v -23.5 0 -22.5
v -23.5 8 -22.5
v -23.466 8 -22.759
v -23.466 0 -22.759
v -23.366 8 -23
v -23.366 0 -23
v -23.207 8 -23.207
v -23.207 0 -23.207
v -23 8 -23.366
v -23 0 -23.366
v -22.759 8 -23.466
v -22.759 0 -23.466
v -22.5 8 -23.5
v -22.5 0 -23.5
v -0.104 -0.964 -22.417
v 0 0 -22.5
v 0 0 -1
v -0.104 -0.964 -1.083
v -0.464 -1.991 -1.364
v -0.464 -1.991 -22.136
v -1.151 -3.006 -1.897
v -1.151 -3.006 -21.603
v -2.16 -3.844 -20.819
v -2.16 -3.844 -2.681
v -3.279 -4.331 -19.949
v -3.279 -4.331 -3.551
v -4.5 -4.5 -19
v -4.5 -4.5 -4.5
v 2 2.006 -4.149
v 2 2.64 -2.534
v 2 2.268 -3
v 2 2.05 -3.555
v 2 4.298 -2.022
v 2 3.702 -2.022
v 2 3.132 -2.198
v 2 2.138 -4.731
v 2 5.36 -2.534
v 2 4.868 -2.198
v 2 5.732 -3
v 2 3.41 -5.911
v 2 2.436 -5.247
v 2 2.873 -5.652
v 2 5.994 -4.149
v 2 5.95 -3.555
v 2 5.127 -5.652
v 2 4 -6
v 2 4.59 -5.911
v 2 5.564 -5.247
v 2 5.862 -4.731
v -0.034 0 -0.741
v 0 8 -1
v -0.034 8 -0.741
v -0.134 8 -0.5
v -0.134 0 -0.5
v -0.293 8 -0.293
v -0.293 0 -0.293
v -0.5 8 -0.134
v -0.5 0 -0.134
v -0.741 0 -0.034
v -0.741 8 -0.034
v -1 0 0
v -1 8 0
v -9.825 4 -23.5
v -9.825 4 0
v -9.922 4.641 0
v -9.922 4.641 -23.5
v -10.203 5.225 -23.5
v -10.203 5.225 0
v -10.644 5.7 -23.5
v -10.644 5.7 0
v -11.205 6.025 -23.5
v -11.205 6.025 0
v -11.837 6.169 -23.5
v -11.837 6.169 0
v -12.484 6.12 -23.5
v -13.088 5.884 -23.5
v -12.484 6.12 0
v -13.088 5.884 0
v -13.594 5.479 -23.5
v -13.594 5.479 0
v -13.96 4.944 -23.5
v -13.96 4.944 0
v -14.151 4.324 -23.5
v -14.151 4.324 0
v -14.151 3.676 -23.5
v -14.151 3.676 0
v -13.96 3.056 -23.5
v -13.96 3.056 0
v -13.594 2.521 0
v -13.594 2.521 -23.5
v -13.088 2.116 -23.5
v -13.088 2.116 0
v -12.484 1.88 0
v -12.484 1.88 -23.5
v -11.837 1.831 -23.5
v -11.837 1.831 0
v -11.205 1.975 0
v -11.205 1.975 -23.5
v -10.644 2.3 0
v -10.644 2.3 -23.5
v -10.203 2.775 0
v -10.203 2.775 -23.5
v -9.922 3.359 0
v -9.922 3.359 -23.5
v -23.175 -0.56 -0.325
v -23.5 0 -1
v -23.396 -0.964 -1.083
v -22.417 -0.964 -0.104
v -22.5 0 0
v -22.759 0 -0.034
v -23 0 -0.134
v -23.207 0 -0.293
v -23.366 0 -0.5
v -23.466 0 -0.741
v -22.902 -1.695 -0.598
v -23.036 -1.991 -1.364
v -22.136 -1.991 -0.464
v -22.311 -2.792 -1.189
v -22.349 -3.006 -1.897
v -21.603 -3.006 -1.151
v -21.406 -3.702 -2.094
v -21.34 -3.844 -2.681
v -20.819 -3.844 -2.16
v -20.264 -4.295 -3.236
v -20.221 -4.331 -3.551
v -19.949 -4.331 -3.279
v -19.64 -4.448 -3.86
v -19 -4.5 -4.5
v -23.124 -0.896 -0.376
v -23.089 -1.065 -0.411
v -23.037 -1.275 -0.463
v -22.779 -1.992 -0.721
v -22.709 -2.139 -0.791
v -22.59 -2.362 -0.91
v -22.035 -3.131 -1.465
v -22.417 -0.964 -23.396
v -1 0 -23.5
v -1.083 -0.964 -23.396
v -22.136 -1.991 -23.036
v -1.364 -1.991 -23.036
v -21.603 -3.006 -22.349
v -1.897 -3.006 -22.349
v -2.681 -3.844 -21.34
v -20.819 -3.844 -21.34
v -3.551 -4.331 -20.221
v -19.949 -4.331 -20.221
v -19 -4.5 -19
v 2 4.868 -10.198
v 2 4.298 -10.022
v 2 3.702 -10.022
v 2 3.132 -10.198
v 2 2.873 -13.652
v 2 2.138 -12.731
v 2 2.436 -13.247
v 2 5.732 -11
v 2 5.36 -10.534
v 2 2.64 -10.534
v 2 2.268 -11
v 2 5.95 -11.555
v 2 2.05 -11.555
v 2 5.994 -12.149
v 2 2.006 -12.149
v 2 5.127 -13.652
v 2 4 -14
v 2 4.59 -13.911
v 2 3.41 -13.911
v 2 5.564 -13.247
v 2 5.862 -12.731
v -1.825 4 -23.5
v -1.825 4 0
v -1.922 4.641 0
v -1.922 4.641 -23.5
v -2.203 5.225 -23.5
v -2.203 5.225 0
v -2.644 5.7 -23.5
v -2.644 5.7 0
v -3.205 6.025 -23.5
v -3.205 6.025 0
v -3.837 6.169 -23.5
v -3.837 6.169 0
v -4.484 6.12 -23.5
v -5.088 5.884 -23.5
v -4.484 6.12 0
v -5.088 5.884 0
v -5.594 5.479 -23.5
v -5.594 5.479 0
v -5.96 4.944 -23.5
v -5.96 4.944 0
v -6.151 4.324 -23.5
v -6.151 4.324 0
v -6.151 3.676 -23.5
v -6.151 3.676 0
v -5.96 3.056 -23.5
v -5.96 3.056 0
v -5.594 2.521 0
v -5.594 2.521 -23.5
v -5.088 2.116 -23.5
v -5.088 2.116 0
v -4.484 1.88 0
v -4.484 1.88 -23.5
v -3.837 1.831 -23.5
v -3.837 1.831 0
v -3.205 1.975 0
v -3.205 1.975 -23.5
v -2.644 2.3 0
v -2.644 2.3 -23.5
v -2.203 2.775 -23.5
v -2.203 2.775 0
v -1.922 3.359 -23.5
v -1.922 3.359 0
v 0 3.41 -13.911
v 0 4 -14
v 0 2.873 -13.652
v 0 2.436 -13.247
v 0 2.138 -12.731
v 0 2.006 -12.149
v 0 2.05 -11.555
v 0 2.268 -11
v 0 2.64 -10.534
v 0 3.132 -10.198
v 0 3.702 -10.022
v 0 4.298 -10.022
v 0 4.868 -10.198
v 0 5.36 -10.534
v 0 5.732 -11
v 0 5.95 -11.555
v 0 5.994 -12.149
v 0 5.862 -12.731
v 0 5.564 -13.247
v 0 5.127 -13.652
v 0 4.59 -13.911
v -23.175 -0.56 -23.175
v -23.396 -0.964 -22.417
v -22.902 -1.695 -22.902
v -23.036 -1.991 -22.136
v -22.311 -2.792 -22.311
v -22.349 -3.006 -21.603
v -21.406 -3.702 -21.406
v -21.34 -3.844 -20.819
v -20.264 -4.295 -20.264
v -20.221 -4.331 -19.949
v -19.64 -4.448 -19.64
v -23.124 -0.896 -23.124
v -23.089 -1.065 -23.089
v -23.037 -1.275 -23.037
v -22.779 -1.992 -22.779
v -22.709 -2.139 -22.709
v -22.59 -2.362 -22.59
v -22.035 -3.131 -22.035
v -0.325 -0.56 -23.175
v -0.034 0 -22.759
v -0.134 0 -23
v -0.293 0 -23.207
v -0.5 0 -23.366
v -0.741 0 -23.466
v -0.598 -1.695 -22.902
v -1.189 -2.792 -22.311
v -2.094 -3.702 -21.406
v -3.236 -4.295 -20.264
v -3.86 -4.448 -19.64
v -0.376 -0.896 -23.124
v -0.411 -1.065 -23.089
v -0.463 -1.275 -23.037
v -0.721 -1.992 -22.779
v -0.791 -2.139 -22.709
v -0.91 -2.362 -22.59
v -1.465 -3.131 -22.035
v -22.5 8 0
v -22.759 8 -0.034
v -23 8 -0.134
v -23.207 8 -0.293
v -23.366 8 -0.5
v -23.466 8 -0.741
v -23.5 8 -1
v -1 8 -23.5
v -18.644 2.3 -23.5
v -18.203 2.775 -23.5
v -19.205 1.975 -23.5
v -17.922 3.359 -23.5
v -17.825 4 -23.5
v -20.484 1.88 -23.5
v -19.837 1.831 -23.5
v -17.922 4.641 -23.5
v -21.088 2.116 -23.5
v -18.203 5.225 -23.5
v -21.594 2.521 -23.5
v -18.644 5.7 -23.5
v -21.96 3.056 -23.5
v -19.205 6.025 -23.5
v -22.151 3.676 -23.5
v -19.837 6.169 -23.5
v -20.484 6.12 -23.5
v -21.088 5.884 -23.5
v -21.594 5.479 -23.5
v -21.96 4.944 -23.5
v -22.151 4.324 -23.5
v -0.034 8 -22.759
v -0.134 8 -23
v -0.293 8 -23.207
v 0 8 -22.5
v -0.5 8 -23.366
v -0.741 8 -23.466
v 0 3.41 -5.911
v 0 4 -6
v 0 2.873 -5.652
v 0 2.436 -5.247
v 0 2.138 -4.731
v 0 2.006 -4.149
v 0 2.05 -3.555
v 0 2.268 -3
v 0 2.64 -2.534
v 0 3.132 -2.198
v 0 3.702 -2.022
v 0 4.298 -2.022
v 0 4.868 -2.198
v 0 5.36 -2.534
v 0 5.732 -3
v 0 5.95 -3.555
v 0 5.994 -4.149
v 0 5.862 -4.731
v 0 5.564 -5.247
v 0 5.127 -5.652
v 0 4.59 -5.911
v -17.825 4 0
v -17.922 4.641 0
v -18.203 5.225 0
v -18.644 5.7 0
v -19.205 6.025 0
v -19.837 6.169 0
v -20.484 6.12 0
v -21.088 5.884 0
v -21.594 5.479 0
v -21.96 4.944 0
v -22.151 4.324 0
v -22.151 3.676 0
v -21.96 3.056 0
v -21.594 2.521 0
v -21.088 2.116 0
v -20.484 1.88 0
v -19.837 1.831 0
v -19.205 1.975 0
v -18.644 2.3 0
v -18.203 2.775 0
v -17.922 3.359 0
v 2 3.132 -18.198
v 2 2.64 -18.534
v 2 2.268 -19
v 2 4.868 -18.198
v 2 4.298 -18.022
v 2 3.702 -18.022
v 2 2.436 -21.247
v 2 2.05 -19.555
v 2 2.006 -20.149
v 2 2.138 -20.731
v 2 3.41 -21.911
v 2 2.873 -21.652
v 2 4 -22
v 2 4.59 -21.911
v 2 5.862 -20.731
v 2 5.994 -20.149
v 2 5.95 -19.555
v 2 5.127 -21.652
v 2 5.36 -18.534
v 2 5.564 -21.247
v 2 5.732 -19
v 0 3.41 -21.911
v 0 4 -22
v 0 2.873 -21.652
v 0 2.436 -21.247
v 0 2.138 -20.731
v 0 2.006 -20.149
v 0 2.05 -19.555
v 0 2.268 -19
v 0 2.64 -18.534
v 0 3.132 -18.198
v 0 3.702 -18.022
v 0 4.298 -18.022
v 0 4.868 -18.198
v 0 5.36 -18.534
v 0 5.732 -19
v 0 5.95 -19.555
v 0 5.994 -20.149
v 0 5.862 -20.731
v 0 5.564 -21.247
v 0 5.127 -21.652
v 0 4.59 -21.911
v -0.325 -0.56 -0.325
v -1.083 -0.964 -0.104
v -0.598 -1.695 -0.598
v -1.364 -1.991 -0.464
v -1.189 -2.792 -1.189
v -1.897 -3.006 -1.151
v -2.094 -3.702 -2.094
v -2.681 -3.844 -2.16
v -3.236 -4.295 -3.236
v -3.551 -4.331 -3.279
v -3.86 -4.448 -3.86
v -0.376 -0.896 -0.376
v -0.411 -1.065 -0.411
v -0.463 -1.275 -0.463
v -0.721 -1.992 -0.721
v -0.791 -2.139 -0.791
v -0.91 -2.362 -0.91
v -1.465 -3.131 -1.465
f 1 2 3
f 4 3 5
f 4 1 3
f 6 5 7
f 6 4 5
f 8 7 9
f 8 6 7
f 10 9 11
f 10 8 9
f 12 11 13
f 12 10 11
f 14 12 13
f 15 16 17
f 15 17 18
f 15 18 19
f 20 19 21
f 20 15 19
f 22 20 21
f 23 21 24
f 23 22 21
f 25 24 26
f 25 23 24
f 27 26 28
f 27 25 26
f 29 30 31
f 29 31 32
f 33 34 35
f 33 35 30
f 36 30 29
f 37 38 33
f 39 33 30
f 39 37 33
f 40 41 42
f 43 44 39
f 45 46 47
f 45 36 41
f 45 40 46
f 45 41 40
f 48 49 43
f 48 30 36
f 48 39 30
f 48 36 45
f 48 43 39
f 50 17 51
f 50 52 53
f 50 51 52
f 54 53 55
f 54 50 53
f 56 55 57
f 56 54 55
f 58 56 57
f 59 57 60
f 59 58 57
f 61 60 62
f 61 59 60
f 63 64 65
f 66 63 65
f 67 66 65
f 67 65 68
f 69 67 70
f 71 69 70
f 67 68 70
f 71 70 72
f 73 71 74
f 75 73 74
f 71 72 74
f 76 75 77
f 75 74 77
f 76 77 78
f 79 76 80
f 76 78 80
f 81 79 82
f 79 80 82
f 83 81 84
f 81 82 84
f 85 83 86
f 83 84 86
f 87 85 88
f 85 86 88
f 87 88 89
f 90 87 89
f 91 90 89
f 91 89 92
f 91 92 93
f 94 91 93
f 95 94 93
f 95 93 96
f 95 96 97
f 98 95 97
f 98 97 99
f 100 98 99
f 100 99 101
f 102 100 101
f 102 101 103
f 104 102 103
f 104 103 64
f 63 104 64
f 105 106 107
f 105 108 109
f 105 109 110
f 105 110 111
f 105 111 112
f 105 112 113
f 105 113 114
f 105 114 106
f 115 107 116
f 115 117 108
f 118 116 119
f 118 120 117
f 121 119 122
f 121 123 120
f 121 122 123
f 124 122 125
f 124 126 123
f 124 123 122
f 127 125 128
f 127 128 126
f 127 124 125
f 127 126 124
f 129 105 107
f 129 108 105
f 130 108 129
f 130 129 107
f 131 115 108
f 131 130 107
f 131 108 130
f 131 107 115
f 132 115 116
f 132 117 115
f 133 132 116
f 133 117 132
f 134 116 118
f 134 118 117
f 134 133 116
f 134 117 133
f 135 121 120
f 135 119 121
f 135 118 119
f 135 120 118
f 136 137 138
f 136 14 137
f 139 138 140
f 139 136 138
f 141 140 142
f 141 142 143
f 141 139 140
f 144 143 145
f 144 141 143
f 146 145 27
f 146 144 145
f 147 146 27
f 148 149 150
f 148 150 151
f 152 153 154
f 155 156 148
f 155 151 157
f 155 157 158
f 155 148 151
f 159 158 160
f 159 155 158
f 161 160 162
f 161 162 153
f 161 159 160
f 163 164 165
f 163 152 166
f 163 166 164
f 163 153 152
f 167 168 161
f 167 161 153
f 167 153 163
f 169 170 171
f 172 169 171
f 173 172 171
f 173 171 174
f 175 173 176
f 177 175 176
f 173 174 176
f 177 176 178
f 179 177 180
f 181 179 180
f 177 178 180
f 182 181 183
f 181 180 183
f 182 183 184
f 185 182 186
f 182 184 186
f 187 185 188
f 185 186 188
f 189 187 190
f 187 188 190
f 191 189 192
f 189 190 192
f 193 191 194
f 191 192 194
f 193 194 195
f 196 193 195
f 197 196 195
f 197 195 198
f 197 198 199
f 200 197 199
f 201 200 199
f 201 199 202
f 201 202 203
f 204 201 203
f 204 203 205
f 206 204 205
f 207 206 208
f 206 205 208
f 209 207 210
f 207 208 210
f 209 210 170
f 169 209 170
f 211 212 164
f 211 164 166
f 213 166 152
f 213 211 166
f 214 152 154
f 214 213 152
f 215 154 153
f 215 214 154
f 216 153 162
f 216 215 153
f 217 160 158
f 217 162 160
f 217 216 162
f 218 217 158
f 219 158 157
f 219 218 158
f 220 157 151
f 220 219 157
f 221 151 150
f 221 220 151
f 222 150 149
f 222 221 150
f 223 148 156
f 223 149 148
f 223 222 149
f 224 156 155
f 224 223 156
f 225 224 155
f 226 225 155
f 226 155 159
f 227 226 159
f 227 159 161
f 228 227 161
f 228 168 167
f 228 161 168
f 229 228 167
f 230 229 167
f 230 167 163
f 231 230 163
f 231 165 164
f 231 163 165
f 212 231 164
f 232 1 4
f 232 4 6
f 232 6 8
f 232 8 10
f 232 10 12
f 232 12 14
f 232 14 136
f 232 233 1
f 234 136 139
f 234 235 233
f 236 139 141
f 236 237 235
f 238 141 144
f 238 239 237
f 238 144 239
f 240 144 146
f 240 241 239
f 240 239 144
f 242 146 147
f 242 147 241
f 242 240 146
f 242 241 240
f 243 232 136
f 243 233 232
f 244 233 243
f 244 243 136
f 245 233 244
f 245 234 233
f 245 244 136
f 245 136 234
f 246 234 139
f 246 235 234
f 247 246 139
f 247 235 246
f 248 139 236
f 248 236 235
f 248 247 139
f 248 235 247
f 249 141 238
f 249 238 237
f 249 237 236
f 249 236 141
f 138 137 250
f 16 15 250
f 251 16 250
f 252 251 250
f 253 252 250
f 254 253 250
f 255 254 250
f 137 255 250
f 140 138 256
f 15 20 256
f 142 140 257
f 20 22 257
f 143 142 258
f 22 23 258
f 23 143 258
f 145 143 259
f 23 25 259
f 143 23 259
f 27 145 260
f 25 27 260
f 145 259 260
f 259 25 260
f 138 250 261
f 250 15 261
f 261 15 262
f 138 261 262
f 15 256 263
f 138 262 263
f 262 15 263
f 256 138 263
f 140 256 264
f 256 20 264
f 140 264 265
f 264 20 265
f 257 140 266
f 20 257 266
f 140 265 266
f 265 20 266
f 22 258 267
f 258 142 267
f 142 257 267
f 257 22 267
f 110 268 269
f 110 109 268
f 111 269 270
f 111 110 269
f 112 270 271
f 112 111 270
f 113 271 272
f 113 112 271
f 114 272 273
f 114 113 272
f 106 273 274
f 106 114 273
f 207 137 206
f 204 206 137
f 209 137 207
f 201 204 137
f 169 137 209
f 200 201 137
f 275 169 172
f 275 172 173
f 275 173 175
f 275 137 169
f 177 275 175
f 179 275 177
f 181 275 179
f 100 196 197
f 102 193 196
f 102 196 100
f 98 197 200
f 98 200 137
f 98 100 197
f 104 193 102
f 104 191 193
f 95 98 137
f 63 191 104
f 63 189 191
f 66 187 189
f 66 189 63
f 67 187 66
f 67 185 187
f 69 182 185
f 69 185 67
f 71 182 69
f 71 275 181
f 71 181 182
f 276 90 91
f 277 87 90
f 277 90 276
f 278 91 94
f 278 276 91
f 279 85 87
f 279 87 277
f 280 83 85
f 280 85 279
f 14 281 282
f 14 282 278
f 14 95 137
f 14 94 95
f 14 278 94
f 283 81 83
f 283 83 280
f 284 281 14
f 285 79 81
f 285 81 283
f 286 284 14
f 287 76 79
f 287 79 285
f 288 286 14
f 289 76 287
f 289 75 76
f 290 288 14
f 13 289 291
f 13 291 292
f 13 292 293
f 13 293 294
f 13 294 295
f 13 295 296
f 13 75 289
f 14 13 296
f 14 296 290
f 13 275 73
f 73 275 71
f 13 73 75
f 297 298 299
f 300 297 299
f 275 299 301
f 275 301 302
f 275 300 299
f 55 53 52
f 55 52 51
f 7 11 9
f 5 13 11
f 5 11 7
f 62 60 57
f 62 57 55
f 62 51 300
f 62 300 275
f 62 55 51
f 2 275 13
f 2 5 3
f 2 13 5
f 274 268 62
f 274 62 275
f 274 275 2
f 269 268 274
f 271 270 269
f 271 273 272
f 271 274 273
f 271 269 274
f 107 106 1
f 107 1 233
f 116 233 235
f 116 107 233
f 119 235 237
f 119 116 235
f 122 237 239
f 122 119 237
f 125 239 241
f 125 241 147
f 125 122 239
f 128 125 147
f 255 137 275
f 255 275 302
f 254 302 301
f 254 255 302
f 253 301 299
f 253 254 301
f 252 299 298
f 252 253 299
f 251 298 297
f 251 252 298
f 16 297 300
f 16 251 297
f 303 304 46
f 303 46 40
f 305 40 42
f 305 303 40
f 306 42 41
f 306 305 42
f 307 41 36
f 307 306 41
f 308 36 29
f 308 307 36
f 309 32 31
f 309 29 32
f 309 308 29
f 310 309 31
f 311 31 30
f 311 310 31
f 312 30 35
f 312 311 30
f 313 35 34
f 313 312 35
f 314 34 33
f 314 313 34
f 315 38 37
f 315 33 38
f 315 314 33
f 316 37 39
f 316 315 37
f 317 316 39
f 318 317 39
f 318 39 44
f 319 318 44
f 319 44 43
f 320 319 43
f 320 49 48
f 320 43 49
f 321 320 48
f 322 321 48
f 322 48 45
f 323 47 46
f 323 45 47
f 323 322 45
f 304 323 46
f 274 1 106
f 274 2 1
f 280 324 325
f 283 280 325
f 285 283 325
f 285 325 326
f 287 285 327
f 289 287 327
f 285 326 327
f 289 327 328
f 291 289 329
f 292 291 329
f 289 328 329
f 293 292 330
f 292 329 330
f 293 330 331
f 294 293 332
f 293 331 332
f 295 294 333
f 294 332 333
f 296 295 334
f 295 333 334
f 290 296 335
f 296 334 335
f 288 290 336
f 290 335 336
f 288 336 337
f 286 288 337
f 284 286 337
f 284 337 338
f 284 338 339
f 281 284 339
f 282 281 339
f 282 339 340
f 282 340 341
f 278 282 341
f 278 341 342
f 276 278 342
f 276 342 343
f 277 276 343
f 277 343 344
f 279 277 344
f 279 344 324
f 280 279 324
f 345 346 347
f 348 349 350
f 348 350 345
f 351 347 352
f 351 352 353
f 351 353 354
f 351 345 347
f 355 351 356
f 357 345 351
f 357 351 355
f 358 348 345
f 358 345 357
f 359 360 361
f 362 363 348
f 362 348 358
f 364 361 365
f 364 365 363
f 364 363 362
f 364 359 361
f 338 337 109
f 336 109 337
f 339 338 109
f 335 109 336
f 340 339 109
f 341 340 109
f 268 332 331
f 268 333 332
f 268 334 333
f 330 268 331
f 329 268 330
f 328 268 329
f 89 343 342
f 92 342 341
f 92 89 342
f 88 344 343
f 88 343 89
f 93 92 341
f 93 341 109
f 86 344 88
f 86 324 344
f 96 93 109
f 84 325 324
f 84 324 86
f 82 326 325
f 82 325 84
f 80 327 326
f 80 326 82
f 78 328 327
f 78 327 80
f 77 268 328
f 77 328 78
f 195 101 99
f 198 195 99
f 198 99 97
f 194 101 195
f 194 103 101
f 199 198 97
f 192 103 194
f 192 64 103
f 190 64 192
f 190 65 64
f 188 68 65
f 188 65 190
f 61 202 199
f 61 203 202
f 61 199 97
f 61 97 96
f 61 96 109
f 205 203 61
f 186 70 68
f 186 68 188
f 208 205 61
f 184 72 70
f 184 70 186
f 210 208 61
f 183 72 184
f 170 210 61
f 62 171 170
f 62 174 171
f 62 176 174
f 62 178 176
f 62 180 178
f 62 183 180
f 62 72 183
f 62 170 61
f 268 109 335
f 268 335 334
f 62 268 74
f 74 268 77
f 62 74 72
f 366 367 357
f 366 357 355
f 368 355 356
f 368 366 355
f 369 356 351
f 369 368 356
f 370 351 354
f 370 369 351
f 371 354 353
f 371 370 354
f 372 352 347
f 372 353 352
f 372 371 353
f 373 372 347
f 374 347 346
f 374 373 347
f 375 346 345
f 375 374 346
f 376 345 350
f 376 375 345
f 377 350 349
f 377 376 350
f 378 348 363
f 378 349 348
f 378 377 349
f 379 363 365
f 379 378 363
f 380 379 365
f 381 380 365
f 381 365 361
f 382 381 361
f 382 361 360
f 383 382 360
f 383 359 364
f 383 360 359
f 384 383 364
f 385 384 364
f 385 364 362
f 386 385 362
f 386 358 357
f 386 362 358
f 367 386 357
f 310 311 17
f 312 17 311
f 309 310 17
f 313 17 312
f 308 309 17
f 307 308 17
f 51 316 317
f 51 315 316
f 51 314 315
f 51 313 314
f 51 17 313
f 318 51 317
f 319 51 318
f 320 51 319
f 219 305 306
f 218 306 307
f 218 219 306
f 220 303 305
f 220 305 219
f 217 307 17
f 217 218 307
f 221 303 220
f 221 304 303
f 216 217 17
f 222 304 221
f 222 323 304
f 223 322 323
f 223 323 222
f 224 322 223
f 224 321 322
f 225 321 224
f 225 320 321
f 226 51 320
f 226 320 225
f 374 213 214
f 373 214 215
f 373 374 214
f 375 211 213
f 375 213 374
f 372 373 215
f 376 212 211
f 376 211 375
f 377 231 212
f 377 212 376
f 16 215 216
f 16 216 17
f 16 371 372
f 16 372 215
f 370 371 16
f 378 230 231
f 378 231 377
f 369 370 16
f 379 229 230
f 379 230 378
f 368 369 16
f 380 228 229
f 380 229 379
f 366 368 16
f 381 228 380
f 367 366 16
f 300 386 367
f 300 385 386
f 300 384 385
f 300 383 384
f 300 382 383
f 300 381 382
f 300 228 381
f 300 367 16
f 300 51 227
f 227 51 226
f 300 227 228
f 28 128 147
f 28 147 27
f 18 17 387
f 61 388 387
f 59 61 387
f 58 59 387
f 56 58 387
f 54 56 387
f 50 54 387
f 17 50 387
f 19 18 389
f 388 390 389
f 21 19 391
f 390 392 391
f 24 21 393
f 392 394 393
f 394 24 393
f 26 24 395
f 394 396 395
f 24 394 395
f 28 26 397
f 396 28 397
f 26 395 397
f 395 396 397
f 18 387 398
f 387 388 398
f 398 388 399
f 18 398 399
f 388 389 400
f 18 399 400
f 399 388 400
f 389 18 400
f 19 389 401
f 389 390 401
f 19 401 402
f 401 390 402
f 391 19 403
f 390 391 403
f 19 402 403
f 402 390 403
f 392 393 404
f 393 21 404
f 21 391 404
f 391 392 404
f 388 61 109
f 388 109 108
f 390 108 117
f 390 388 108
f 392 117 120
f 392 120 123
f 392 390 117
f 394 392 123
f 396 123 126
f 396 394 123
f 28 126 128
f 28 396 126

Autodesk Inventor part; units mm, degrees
ref_plane "YZ Plane" through (0, 0, 0) normal (1, 0, 0) x (0, 1, 0)
ref_plane "XZ Plane" through (0, 0, 0) normal (0, 1, 0) x (-1, 0, 0)
ref_plane "XY Plane" through (0, 0, 0) normal (0, 0, 1) x (1, 0, 0)
sketch "Sketch1" plane through (0, 0, 0) normal (0, 1, 0) x (-1, 0, 0)
  line L0 (0, 0) -> (23.5, 0)
  line L1 (23.5, 0) -> (23.5, -23.5)
  line L2 (23.5, -23.5) -> (0, -23.5)
  line L3 (0, -23.5) -> (0, 0)
  dimension "d0" = 23.5
  dimension "d1" = 23.5
extrude "Extrusion1" add sketch "Sketch1" along normal blind 8
sketch "Sketch2" plane through (0, 0, 0) normal (1, 0, 0) x (0, 0, -1)
  circle A0 centre (4, 4) radius 2
  circle A1 centre (12, 4) radius 2
  circle A2 centre (20, 4) radius 2
  line L0 (0, 0) -> (0, 8) projected
  point P0 (0, 4)
  dimension "d4" = 4
  dimension "d5" = 4
  dimension "d6" = 4
  dimension "d7" = 4
  dimension "d8" = 8
  dimension "d9" = 8
extrude "Extrusion2" add sketch "Sketch2" along normal blind 2
sketch "Sketch3" plane through (-23.5, 0, 0) normal (0, 0, 1) x (1, 0, 0)
  circle A0 centre (19.5, 4) radius 2.175
  circle A1 centre (11.5, 4) radius 2.175
  circle A2 centre (3.5, 4) radius 2.175
  line L0 (23.5, 0) -> (23.5, 8) projected
  dimension "d12" = 4.35
  dimension "d13" = 4.35
  dimension "d14" = 4.35
  dimension "d15" = 4
  dimension "d16" = 8
  dimension "d17" = 8
extrude "Extrusion3" cut sketch "Sketch3" against normal blind 27
sketch "Sketch6" plane through (0, 0, 0) normal (0, -1, 0) x (1, 0, 0)
  line L0 (-23.5, 0) -> (0, 0) projected
  line L1 (0, -23.5) -> (-23.5, -23.5) projected
  line L2 (-23.5, 0) -> (0, 0)
  line L3 (0, 0) -> (0, -23.5)
  line L4 (0, -23.5) -> (-23.5, -23.5)
  line L5 (-23.5, -23.5) -> (-23.5, 0)
extrude "Extrusion5" add sketch "Sketch6" along normal blind 4.5
fillet "Fillet1" radius 4.5 4 edges at (-11.75, -4.5, 0) (0, -4.5, -11.75) (-11.75, -4.5, -23.5) (-23.5, -4.5, -11.75)
fillet "Fillet2" radius 1 8 edges at (-1.318, -3.182, -1.318) (0, 4, 0) (-1.318, -3.182, -22.182) (0, 4, -23.5) (-23.5, 4, -23.5) (-22.182, -3.182, -22.182) (-23.5, 4, 0) (-22.182, -3.182, -1.318)
properties part number "base_support"
